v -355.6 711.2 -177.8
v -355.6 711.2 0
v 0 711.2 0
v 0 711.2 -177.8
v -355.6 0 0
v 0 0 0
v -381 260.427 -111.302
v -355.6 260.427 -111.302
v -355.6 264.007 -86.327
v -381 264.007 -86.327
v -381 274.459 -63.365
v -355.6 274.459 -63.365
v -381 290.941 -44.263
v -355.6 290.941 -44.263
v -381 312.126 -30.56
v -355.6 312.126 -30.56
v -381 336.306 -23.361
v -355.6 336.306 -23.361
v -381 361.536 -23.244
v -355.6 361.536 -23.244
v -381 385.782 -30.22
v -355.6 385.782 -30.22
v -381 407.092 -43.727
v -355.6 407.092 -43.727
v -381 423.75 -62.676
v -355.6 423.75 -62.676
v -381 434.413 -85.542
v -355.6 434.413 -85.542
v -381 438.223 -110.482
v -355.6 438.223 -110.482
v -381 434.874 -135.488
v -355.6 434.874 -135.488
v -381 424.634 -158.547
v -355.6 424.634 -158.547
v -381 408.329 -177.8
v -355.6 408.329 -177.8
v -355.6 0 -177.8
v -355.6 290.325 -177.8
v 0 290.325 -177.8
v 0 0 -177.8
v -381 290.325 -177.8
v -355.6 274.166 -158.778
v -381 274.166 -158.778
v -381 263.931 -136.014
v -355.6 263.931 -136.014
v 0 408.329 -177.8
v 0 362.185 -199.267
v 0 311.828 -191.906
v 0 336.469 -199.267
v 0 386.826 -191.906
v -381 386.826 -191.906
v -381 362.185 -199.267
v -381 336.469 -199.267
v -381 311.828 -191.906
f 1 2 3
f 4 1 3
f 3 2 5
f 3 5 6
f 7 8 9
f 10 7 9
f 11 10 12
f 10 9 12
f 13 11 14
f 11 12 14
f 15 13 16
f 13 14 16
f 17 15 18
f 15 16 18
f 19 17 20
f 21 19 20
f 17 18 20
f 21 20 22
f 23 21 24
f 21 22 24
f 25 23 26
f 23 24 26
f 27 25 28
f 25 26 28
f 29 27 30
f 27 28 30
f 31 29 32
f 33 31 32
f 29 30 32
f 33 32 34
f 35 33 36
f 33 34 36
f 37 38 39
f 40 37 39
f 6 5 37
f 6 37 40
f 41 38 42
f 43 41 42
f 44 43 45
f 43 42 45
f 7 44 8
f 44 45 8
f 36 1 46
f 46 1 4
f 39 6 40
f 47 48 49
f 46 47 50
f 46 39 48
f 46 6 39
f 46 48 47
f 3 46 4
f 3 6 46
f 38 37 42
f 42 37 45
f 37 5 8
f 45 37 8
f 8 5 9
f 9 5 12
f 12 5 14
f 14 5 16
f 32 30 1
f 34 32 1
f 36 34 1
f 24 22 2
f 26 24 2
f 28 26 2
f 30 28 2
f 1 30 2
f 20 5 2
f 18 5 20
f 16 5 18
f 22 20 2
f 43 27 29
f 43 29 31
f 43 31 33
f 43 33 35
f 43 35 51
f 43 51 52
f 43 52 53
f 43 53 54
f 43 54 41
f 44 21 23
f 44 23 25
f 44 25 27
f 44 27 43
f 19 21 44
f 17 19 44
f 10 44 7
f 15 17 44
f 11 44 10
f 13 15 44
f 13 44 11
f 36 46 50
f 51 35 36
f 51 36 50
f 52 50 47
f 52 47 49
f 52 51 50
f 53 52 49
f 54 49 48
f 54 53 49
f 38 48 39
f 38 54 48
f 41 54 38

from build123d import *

# Parameters (mm, degrees)
F0_W          = 355.6
F0_H          = 711.2
F1_DEPTH      = 177.8
F3_DEPTH      = 25.4
F3_DEPTH_BACK = 355.6


with BuildPart() as f1:
    # F0 (on Top) → F1 (new body)
    with BuildSketch(Plane.XY):
        with Locations((-177.8, 355.6)):
            Rectangle(F0_W, F0_H)
    extrude(amount=-F1_DEPTH)

    # F2 (on face) → F3 (join, two sides)
    with BuildSketch(Plane(origin=(-355.6, 0, 0), x_dir=(0, -1, 0), z_dir=(-1, 0, 0))) as f3_sk:
        with BuildLine():
            ThreePointArc((-290.325146, -177.8), (-268.245349, -147.75703), (-260.427027, -111.30197))
            ThreePointArc((-260.427027, -111.30197), (-385.782087, -30.220291), (-408.328908, -177.8))
            Line((-408.328908, -177.8), (-290.325146, -177.8))
        make_face()
        with BuildLine():
            Line((-290.325146, -177.8), (-408.328908, -177.8))
            ThreePointArc((-408.328908, -177.8), (-349.327027, -200.20197), (-290.325146, -177.8))
        make_face()
    extrude(amount=F3_DEPTH)
    extrude(f3_sk.sketch, amount=-F3_DEPTH_BACK)


solid = f1.part
